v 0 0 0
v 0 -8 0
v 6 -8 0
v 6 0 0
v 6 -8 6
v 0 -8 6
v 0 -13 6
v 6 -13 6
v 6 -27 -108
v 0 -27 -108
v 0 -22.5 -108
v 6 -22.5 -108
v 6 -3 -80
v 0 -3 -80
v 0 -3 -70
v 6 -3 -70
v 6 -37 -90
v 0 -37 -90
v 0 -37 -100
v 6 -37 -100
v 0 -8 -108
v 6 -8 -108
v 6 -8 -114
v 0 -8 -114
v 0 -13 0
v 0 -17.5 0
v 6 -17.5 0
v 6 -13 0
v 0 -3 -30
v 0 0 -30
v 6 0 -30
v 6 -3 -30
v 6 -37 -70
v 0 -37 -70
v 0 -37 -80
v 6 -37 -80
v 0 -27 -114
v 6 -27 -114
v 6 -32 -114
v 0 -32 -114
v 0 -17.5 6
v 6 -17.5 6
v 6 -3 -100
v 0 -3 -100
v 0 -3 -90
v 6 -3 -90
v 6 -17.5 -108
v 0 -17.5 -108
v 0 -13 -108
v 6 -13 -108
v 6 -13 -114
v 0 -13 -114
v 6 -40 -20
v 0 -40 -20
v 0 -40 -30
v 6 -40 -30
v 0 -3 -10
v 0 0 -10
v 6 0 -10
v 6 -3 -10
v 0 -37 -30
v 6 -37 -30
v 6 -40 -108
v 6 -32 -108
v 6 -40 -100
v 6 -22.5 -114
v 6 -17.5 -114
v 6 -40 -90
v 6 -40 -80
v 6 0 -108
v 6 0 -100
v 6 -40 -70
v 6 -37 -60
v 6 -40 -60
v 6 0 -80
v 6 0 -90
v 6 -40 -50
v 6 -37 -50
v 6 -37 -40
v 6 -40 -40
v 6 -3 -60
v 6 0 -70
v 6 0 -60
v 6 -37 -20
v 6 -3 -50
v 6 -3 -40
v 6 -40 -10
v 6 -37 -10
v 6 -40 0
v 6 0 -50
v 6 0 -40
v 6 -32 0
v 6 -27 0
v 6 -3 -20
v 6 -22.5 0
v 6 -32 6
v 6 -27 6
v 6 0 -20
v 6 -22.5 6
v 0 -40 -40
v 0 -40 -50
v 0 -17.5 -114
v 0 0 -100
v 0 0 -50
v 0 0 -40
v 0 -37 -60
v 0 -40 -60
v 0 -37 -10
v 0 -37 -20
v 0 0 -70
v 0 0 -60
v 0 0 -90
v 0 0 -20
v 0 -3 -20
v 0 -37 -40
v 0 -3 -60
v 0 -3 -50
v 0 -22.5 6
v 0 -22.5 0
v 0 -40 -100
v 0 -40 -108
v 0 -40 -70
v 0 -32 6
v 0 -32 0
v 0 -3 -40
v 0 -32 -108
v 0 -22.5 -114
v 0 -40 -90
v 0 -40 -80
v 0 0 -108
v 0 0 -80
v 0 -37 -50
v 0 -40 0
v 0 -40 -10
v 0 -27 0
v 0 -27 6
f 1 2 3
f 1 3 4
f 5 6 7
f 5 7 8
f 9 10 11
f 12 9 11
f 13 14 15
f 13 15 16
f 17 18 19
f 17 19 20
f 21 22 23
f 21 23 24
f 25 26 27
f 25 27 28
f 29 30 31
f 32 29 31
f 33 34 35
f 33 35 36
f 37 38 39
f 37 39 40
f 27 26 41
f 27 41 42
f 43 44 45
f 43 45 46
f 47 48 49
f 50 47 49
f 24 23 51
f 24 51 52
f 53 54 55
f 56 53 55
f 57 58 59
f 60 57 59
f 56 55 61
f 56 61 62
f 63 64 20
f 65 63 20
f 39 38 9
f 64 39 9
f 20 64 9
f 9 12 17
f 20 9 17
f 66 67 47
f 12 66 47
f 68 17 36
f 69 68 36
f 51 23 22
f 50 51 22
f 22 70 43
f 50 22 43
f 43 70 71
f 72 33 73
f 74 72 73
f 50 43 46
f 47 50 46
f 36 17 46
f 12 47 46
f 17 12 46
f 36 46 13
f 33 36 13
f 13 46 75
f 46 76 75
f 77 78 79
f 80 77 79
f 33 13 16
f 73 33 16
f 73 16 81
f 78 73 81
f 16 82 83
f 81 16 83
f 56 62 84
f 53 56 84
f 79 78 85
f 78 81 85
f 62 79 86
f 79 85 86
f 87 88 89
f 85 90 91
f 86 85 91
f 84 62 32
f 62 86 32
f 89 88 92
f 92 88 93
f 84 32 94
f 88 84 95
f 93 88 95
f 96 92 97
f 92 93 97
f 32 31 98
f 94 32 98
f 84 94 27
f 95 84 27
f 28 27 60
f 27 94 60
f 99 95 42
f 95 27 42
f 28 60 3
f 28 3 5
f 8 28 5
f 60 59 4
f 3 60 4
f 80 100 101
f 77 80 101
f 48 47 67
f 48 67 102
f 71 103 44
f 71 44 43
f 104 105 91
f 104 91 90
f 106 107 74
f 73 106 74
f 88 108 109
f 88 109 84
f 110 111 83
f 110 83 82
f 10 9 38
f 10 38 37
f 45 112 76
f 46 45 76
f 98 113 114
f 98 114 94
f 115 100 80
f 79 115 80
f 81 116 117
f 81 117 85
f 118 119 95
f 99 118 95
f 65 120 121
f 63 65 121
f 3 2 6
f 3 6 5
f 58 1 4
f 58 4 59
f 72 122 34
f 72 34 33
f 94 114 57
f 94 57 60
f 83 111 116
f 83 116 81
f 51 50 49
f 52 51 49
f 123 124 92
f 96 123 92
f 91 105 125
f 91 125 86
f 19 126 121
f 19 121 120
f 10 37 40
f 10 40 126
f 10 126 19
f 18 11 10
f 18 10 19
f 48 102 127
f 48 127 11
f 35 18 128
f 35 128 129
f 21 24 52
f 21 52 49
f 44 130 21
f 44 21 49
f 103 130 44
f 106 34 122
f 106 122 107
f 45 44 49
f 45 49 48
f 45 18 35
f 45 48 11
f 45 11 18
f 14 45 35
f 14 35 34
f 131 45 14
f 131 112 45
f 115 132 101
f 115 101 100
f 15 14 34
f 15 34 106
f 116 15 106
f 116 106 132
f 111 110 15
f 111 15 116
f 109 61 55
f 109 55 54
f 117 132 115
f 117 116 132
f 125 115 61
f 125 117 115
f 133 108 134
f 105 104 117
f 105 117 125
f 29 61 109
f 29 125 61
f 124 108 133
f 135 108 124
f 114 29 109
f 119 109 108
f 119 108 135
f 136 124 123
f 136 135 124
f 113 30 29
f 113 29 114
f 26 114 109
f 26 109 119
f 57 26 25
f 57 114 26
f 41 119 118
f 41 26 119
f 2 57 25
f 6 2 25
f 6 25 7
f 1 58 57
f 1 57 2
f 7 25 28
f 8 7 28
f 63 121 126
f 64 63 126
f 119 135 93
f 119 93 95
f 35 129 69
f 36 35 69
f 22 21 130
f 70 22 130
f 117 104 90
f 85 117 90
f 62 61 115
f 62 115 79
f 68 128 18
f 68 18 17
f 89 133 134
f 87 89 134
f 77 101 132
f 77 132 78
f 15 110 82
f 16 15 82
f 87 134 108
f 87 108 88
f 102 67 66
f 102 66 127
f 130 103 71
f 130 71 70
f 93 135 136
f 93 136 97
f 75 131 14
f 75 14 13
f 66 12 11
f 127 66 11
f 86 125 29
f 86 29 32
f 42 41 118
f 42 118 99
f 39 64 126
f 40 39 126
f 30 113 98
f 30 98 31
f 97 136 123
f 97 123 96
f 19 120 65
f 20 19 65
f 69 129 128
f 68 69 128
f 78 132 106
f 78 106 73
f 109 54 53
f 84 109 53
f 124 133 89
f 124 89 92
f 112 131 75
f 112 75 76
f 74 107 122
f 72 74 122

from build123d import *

# Parameters (mm, degrees)
SKETCH_1_W             = 108
SKETCH_1_H             = 40
EXTRUDE_2_DEPTH        = 6
SKETCH_3_W             = 6
SKETCH_3_H             = 5
EXTRUDE_3_DEPTH        = 6
SKETCH_4_W             = 6
SKETCH_4_H             = 5
EXTRUDE_4_DEPTH        = 6
SKETCH_5_W             = 6
SKETCH_5_H             = 10
CUT_EXTRUDE_1_DEPTH    = 4
SKETCH_6_W             = 6
SKETCH_6_H             = 10
EXTRUDE_5_DEPTH        = 1
PATTERN_LINEAR_1_COUNT = 5
PATTERN_LINEAR_1_PITCH = 20
SKETCH_8_W             = 6
SKETCH_8_H             = 10
CUT_EXTRUDE_2_DEPTH    = 3


with BuildPart() as part:
    # Эскиз1 → Бобышка-Вытянуть2 (new body)
    with BuildSketch(Plane(origin=(0, 0, 0), x_dir=(0, 0, -1), z_dir=(1, 0, 0))):
        with Locations((54, -20)):
            Rectangle(SKETCH_1_W, SKETCH_1_H)
    extrude(amount=EXTRUDE_2_DEPTH)

    # Эскиз3 → Бобышка-Вытянуть3 (add)
    with BuildSketch(Plane.XY):
        with Locations((3, -10.5)):
            Rectangle(SKETCH_3_W, SKETCH_3_H)
        with Locations((3, -20)):
            Rectangle(SKETCH_3_W, SKETCH_3_H)
        with Locations((3, -29.5)):
            Rectangle(SKETCH_3_W, SKETCH_3_H)
    extrude(amount=EXTRUDE_3_DEPTH)

    # Эскиз4 → Бобышка-Вытянуть4 (add)
    with BuildSketch(Plane(origin=(0, 0, -108), x_dir=(-1, 0, 0), z_dir=(0, 0, -1))):
        with Locations((-3, -10.5)):
            Rectangle(SKETCH_4_W, SKETCH_4_H)
        with Locations((-3, -20)):
            Rectangle(SKETCH_4_W, SKETCH_4_H)
        with Locations((-3, -29.5)):
            Rectangle(SKETCH_4_W, SKETCH_4_H)
    extrude(amount=EXTRUDE_4_DEPTH)

    # Эскиз5 → Вырез-Вытянуть1 (cut)
    with BuildSketch(Plane.XZ.offset(40)):
        with Locations((3, -15)):
            Rectangle(SKETCH_5_W, SKETCH_5_H)
        with Locations((3, -35)):
            Rectangle(SKETCH_5_W, SKETCH_5_H)
        with Locations((3, -55)):
            Rectangle(SKETCH_5_W, SKETCH_5_H)
        with Locations((3, -75)):
            Rectangle(SKETCH_5_W, SKETCH_5_H)
        with Locations((3, -95)):
            Rectangle(SKETCH_5_W, SKETCH_5_H)
    extrude(amount=-CUT_EXTRUDE_1_DEPTH, mode=Mode.SUBTRACT)

    # Эскиз6 → Бобышка-Вытянуть5 (add)
    with BuildSketch(Plane.XZ.offset(36)):
        with Locations((3, -15)):
            Rectangle(SKETCH_6_W, SKETCH_6_H)
    extrude_5 = extrude(amount=EXTRUDE_5_DEPTH)

    # Линейный массив1: Бобышка-Вытянуть5 ×5
    with Locations(*[(0, 0, -i * PATTERN_LINEAR_1_PITCH) for i in range(1, PATTERN_LINEAR_1_COUNT)]):
        add(extrude_5)

    # Эскиз8 → Вырез-Вытянуть2 (cut)
    with BuildSketch(Plane(origin=(0, 0, 0), x_dir=(1, 0, 0), z_dir=(0, 1, 0))):
        with Locations((3, 15)):
            Rectangle(SKETCH_8_W, SKETCH_8_H)
        with Locations((3, 35)):
            Rectangle(SKETCH_8_W, SKETCH_8_H)
        with Locations((3, 55)):
            Rectangle(SKETCH_8_W, SKETCH_8_H)
        with Locations((3, 75)):
            Rectangle(SKETCH_8_W, SKETCH_8_H)
        with Locations((3, 95)):
            Rectangle(SKETCH_8_W, SKETCH_8_H)
    extrude(amount=-CUT_EXTRUDE_2_DEPTH, mode=Mode.SUBTRACT)


solid = part.part
